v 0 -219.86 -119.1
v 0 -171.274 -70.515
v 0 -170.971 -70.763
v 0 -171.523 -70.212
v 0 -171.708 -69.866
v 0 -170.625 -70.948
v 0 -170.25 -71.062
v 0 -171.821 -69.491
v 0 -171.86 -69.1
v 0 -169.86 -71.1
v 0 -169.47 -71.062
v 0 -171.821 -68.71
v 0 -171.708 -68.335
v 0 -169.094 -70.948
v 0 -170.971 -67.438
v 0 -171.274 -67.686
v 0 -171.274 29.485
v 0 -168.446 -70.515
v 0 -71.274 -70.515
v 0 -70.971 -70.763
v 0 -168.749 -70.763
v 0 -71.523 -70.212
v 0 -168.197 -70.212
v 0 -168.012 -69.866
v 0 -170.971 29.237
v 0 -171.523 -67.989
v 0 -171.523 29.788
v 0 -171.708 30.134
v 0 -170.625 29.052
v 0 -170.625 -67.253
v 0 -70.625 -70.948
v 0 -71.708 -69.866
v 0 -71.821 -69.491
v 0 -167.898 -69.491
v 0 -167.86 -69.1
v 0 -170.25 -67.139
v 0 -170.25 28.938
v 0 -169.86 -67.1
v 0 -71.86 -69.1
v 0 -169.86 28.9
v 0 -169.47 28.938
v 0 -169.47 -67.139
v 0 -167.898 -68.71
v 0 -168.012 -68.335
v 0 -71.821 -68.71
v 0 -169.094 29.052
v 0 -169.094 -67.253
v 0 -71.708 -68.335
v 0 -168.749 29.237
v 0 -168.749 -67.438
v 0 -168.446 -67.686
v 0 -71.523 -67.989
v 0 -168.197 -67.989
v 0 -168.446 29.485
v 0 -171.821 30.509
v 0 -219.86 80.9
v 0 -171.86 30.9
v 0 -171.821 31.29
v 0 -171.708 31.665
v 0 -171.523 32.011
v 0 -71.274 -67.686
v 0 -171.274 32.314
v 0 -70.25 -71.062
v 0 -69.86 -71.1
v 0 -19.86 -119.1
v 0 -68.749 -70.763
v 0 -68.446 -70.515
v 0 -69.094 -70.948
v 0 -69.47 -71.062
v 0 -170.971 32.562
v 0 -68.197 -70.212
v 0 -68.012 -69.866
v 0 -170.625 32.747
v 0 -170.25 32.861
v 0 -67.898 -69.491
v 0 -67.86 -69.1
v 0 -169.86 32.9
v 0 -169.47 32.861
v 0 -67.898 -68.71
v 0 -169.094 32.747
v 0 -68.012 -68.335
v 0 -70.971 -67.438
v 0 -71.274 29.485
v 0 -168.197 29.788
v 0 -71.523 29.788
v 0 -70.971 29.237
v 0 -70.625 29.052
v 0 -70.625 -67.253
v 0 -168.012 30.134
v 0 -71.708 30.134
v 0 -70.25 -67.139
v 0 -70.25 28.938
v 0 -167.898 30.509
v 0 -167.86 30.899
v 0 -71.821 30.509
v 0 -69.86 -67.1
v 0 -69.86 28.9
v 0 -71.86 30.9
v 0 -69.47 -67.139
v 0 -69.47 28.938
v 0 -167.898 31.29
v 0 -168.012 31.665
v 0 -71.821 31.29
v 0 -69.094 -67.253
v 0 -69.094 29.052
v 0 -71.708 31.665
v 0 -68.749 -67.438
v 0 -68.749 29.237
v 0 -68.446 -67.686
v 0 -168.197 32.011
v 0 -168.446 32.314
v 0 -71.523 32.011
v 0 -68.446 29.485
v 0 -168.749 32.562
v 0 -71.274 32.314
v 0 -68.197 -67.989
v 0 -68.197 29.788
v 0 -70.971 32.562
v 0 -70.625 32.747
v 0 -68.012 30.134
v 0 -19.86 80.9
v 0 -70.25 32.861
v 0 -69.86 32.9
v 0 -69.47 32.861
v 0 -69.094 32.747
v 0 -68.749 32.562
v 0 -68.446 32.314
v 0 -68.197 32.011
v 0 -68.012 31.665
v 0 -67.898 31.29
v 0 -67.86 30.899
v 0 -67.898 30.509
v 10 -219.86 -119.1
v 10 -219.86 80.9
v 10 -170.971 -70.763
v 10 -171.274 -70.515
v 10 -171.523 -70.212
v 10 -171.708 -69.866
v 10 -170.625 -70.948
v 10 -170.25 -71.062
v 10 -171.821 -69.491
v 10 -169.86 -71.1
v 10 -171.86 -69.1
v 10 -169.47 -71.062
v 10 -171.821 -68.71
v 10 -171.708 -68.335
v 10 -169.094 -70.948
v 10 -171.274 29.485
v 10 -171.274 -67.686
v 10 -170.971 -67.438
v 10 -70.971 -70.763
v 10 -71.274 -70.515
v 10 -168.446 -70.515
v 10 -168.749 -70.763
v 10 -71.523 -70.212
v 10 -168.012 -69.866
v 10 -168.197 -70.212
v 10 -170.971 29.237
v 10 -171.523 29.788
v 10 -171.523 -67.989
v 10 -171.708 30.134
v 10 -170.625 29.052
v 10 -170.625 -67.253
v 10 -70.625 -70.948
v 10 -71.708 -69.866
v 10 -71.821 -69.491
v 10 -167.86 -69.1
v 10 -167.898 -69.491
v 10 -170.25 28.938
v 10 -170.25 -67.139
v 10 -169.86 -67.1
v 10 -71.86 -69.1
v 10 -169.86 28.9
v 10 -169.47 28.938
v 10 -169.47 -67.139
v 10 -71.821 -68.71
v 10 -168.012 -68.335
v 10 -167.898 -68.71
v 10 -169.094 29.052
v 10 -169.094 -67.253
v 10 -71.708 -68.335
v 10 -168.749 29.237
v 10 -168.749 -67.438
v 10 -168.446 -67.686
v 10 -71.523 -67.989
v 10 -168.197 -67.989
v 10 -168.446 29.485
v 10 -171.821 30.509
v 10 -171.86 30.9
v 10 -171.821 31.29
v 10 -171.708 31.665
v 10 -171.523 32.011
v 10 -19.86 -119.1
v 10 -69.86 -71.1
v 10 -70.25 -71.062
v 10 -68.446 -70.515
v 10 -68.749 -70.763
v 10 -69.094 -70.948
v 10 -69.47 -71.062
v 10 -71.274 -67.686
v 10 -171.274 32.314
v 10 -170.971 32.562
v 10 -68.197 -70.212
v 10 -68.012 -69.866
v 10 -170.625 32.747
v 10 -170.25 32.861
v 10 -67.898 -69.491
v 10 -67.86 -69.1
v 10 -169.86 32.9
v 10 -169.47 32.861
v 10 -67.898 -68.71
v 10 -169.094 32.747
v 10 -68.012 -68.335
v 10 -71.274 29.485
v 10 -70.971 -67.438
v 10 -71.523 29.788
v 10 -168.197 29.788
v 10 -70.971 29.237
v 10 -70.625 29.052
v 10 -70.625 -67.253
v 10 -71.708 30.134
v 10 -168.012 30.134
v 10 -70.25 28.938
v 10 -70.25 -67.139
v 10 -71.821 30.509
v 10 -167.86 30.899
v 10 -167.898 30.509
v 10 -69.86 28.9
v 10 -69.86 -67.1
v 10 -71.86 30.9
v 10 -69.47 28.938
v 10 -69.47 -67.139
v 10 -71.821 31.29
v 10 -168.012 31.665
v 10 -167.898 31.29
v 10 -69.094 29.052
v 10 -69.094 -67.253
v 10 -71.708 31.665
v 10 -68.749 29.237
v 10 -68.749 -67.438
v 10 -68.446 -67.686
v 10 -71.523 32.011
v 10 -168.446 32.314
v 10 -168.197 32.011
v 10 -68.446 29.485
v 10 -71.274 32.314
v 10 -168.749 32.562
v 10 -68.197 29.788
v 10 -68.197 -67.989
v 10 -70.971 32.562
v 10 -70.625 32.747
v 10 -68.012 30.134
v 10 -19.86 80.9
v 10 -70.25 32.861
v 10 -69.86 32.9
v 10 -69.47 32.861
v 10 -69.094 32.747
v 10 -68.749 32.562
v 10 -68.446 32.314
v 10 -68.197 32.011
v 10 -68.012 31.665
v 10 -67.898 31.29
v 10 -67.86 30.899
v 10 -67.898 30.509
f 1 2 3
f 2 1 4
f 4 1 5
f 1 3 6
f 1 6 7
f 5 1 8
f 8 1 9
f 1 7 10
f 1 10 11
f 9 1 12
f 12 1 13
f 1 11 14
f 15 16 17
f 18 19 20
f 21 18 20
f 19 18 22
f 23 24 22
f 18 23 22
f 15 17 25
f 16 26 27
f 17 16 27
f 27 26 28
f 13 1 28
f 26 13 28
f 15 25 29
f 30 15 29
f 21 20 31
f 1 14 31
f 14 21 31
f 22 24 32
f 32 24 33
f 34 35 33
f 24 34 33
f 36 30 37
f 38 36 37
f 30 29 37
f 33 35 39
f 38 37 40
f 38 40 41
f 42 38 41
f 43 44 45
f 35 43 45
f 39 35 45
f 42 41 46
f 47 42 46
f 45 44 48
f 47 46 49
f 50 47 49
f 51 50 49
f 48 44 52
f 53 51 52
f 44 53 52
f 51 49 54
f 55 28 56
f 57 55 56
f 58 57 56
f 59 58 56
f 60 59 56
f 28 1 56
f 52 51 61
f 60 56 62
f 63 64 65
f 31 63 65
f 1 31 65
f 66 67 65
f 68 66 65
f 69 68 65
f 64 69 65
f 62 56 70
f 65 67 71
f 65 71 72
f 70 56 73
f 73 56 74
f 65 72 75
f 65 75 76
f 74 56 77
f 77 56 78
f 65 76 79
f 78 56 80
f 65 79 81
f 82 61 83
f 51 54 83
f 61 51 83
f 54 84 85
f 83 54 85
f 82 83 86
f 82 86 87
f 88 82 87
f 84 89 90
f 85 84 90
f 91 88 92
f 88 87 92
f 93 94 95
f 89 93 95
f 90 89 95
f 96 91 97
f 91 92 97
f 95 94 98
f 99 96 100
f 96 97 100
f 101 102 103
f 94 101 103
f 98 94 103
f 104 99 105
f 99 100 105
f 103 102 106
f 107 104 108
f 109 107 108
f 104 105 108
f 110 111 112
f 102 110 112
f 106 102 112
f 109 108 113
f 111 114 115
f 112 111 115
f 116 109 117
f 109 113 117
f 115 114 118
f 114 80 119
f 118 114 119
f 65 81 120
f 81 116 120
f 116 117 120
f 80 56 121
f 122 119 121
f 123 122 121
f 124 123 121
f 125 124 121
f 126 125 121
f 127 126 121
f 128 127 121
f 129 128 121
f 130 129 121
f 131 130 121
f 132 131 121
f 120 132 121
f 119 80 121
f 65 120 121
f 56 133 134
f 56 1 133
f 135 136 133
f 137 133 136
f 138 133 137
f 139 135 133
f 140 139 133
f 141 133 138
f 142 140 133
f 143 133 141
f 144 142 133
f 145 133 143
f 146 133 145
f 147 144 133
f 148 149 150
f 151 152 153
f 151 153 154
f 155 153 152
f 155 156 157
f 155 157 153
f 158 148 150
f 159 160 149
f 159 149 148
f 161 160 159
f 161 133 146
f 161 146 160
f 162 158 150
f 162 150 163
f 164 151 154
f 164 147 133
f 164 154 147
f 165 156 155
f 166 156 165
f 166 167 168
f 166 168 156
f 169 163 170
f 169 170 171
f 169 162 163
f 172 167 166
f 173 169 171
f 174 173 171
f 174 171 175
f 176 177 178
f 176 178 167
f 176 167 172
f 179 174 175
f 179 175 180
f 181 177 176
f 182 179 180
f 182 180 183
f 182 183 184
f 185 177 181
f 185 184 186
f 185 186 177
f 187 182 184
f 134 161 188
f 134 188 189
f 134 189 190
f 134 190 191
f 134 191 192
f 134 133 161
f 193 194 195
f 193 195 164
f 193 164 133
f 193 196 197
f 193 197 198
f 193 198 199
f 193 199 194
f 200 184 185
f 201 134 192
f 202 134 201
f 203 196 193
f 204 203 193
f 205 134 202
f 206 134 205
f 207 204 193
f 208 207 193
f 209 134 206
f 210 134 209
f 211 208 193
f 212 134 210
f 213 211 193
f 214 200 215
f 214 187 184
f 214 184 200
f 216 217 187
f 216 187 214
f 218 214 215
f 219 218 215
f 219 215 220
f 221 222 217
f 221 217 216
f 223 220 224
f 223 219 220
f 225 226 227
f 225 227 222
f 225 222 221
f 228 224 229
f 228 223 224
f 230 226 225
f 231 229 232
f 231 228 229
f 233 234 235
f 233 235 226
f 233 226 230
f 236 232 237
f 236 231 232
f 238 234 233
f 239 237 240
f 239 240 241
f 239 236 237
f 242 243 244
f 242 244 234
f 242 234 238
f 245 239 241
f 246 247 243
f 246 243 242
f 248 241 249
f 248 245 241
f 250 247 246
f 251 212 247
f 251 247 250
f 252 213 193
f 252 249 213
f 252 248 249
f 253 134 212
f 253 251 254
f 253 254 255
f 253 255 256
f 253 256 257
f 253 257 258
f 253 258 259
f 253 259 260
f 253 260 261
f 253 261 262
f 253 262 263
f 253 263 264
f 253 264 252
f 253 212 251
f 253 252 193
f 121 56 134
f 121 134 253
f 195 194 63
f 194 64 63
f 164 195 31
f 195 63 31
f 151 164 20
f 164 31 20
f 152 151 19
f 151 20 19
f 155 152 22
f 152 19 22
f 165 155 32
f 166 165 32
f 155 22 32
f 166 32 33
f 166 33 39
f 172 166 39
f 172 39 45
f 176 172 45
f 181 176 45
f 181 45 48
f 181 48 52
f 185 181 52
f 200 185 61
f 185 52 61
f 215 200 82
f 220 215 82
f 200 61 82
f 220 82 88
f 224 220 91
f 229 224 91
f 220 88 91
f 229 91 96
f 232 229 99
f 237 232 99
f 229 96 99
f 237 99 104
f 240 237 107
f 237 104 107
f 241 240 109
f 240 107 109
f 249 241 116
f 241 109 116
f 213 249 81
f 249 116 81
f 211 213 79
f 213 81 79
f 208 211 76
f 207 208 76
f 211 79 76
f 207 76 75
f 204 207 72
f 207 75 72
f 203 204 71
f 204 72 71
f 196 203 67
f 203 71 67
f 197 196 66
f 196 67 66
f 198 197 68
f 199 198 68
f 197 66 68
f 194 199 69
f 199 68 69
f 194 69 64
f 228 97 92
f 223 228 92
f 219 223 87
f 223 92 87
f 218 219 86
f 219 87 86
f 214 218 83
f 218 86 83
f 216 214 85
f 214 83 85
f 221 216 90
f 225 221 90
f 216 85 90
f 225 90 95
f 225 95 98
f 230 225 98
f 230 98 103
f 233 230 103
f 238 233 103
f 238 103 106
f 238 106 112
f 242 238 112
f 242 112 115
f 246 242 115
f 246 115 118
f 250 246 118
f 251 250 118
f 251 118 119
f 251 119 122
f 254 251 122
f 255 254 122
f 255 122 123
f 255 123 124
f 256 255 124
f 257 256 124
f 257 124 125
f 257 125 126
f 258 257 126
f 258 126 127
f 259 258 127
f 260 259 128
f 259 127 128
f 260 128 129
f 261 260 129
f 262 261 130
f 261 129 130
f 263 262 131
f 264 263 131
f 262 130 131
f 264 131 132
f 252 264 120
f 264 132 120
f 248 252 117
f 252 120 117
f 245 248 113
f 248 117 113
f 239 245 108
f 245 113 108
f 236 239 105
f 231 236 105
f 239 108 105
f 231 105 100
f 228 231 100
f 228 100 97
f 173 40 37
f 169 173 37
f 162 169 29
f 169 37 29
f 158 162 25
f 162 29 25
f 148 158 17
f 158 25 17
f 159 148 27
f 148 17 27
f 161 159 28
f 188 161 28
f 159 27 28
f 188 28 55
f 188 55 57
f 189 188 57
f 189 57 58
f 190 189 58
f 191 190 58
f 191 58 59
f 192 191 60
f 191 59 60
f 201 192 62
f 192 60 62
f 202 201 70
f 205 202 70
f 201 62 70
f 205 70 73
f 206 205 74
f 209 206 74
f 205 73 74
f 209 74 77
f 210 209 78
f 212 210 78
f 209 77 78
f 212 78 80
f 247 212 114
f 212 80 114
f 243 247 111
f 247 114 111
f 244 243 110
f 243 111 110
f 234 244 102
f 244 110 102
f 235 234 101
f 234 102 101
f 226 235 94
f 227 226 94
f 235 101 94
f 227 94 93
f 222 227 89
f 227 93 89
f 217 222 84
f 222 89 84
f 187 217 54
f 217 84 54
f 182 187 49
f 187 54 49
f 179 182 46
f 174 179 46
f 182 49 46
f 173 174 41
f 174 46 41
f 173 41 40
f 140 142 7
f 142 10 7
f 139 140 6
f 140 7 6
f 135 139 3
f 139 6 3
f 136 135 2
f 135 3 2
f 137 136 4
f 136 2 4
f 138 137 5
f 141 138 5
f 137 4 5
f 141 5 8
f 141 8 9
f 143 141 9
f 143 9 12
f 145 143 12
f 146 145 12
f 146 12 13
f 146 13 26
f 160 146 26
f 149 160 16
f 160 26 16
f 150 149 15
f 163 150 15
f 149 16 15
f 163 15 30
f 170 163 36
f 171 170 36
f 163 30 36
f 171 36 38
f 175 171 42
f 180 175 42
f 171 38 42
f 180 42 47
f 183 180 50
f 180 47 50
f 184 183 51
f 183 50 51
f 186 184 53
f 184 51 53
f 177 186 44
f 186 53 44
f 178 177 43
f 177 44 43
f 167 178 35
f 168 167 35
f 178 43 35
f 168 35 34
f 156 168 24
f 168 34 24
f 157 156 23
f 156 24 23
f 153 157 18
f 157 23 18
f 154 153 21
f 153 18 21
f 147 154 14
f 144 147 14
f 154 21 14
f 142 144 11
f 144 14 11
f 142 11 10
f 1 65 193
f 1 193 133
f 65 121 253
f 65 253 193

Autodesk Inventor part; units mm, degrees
ref_plane "YZ Plane" through (0, 0, 0) normal (1, 0, 0) x (0, 1, 0)
ref_plane "XZ Plane" through (0, 0, 0) normal (0, 1, 0) x (-1, 0, 0)
ref_plane "XY Plane" through (0, 0, 0) normal (0, 0, 1) x (1, 0, 0)
sketch "スケッチ1" plane through (0, 0, 0) normal (1, 0, 0) x (0, 1, 0)
  line L0 (-219.8598, 80.8995) -> (-19.8598, 80.8995)
  line L1 (-19.8598, 80.8995) -> (-19.8598, -119.1005)
  line L2 (-19.8598, -119.1005) -> (-219.8598, -119.1005)
  line L3 (-219.8598, -119.1005) -> (-219.8598, 80.8995)
  point P0 (0, 0)
  dimension "d0" = 200
  dimension "d2" = 200
extrude "押し出し1" add sketch "スケッチ1" along normal blind 10
sketch "スケッチ2" plane through (10, 0, 0) normal (1, 0, 0) x (0, 0, -1)
  line L0 (-80.8995, -19.8598) -> (-80.8995, -219.8598) projected
  line L1 (119.1005, -19.8598) -> (-80.8995, -19.8598) projected
  point P0 (0, 0)
  point P1 (-30.8995, -69.8598)
  point P2 (69.1005, -69.8598)
  point P3 (69.1005, -169.8598)
  point P4 (-30.8995, -169.8598)
  dimension "d5" = 100
  dimension "d7" = 100
  dimension "d8" = 50
  dimension "d9" = 100
  dimension "d10" = 50
hole "穴1" at (10, -69.8598, 30.8995) at (10, -69.8598, -69.1005) at (10, -169.8598, -69.1005) at (10, -169.8598, 30.8995) direction (-1, 0, 0) diameter 4 end through all
properties material "アルミニウム 6061"
